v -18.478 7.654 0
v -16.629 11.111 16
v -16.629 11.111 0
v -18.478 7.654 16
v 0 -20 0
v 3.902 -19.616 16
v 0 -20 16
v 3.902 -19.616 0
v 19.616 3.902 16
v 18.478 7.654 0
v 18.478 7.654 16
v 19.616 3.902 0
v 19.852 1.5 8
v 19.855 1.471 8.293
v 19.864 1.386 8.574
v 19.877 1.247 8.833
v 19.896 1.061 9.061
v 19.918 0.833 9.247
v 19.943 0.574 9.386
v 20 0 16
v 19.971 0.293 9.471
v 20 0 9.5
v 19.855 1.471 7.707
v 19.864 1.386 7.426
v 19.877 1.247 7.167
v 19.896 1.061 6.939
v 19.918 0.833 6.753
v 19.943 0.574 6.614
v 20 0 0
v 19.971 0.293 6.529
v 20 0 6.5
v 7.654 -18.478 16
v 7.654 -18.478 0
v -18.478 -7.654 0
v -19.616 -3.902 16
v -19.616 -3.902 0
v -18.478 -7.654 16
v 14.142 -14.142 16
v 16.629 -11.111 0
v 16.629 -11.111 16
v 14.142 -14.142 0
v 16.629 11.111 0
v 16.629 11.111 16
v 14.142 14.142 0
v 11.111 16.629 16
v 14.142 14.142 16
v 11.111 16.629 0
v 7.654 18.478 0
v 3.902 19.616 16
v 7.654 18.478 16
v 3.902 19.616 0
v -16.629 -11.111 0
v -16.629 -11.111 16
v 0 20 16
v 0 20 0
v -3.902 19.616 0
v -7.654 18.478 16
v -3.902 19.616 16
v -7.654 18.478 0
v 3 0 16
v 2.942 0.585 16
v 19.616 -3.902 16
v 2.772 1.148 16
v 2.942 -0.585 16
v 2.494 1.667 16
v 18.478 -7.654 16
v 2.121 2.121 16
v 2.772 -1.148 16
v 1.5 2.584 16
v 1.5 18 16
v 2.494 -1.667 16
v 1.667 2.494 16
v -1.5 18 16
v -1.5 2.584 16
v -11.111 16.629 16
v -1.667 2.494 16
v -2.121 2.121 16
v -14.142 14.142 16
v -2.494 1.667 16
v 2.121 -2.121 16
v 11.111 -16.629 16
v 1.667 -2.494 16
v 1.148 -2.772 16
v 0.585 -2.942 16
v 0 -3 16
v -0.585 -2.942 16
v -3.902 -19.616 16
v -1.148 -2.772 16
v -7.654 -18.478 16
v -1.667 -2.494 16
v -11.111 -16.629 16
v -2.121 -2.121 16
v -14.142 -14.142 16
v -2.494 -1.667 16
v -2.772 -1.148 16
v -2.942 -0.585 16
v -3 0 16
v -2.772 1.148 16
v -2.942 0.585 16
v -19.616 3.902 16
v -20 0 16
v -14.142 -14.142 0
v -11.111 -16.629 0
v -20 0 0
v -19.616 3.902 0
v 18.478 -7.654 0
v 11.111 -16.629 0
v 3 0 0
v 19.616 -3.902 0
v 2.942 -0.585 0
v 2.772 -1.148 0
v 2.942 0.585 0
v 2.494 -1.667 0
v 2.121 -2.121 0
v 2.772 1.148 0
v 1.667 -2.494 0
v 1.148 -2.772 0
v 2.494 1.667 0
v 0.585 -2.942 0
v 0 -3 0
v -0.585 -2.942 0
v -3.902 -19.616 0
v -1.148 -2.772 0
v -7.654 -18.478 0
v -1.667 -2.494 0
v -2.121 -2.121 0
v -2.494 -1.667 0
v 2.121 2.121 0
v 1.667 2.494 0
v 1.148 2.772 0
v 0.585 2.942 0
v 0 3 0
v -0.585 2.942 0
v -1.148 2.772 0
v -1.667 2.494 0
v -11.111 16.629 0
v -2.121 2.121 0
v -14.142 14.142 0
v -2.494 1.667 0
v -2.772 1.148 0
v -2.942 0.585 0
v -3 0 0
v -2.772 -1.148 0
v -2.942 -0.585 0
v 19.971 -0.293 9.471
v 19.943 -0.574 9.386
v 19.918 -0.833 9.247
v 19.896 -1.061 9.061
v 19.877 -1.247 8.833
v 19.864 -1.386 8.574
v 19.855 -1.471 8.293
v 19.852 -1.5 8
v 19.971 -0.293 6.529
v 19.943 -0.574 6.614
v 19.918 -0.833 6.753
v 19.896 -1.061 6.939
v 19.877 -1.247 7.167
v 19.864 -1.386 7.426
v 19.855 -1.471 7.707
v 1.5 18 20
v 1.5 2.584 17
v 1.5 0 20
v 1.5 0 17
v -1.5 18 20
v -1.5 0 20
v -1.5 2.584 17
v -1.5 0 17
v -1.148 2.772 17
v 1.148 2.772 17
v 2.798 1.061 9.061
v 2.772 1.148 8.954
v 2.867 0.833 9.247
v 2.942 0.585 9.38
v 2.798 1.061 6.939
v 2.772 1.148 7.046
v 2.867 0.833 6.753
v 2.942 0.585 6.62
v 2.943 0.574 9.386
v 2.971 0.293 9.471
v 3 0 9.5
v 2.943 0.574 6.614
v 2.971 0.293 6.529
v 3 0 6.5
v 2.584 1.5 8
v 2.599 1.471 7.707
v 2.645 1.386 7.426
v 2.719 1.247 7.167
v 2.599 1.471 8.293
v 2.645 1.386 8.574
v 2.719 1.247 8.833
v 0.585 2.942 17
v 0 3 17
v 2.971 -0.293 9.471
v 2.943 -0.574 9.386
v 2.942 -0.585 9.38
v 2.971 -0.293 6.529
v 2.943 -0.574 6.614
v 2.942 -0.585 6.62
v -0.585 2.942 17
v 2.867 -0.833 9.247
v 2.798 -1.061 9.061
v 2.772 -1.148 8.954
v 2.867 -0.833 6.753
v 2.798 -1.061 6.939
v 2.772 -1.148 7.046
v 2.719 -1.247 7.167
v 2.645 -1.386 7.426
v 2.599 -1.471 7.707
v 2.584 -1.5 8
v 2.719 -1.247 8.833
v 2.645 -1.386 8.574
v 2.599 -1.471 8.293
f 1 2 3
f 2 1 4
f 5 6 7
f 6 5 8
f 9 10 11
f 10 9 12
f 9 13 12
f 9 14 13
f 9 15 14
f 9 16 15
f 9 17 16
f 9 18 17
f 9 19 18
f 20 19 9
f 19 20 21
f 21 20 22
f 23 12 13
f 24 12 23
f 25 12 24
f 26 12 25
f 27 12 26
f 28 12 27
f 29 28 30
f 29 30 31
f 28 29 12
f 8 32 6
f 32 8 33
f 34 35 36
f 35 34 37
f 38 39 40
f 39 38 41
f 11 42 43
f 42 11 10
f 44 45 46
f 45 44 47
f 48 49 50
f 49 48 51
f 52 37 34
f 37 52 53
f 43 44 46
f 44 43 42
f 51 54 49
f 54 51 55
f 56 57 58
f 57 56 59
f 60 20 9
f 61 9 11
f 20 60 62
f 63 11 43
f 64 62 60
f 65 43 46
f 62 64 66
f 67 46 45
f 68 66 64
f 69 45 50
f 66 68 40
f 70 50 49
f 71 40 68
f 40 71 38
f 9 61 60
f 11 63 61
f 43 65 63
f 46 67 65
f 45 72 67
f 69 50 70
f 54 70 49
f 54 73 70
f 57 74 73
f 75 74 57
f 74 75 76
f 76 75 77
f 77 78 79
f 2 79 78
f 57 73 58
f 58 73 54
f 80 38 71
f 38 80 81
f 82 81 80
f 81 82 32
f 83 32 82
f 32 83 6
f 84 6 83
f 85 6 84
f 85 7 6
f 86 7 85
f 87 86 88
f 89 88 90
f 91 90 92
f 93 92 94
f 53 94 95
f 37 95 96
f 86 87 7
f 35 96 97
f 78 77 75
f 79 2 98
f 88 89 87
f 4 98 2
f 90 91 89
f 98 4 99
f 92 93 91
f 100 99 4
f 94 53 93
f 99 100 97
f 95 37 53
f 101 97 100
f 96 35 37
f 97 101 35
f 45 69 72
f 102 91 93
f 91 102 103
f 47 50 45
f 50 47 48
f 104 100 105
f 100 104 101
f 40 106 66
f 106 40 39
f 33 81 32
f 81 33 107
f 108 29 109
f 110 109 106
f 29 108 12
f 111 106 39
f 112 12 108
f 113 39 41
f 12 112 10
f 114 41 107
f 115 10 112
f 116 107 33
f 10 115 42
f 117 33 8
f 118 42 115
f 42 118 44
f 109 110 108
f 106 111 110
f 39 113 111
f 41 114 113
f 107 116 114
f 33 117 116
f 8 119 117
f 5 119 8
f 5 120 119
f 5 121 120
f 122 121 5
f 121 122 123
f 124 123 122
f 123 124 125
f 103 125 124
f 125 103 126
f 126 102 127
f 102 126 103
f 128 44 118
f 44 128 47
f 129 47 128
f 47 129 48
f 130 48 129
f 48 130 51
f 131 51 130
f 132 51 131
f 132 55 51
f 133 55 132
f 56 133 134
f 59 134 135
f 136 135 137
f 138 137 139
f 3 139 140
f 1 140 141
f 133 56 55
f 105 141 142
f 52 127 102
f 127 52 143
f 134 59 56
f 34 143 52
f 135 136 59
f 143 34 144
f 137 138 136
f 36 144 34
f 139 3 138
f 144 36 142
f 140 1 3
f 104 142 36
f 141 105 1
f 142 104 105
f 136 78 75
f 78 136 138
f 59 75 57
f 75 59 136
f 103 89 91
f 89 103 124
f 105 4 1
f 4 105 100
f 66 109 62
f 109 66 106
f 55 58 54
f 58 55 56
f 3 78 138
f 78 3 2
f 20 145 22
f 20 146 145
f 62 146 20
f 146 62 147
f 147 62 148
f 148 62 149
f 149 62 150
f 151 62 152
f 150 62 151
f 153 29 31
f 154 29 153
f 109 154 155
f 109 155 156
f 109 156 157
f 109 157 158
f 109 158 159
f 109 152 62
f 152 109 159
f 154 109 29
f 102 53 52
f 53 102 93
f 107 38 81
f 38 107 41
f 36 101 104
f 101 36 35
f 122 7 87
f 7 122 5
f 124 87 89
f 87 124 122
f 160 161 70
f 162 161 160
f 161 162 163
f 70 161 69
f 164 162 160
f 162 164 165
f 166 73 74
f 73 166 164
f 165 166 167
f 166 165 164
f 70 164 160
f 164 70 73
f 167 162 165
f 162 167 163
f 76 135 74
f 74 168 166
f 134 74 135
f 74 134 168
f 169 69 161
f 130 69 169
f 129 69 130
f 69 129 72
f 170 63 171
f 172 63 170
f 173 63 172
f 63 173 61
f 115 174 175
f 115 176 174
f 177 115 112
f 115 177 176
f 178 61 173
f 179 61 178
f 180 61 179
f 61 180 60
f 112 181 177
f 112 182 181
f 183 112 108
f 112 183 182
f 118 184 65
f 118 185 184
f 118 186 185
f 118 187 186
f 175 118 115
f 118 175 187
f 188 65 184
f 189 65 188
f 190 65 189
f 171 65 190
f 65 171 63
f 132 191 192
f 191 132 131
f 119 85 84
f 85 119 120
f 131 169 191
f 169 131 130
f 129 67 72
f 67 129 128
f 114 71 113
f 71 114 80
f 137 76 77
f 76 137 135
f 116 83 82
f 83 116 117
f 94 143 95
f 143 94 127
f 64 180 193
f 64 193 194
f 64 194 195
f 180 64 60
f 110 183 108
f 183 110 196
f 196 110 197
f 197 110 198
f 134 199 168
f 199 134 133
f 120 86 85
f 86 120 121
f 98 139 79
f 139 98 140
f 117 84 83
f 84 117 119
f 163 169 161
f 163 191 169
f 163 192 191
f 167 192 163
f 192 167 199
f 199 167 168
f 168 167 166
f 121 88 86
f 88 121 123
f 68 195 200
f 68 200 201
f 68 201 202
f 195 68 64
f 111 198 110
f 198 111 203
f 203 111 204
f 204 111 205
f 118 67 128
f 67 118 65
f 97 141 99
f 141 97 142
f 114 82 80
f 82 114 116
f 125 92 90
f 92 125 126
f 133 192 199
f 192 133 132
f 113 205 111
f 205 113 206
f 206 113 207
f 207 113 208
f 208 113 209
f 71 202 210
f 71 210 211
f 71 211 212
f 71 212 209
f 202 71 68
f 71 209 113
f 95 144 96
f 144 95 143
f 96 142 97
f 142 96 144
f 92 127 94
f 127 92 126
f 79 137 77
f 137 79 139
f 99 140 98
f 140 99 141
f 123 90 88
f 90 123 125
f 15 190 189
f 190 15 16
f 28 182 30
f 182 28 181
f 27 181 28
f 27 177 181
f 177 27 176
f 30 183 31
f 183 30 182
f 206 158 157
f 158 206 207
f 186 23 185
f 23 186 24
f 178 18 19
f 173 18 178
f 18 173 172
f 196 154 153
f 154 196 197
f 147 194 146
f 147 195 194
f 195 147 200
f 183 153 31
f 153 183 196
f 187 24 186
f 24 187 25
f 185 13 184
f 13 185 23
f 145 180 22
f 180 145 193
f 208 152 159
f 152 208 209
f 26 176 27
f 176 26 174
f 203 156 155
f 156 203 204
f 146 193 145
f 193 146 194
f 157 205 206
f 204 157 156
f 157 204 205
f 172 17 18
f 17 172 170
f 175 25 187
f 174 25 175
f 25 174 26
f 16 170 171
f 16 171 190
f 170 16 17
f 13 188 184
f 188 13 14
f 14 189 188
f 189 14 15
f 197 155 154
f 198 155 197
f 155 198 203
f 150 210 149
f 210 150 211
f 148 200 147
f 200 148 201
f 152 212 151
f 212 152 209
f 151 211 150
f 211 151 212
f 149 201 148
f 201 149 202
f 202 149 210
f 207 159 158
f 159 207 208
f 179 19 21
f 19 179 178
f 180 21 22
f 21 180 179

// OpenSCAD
$fn = 32;

// ----------------------------------------------------------------------
// Control knob: pointer knob
// ----------------------------------------------------------------------

// --- parameters (mm) ---
rib_w = 3;                // pointer rib width
rib_h = 5;                // pointer rib height
knob_d = 40;              // knob body diameter
knob_h = 16;              // knob body height
bore_d = 6;               // shaft bore diameter
set_d = 3;                // set screw bore diameter

rib_poke = rib_h - 1;  // rib height above the top
total_h = knob_h + rib_h - 1;  // overall height

difference() {
  union() {
    cylinder(h = knob_h, d = knob_d);
    translate([-rib_w / 2, 0, knob_h - 1])
      cube([rib_w, knob_d / 2 - 2, rib_h]);
  }
  translate([0, 0, -1]) cylinder(h = knob_h + 2, d = bore_d);
  translate([-1, 0, knob_h / 2]) rotate([0, 90, 0])
    cylinder(h = knob_d / 2 + bore_d / 2 + 2, d = set_d);}
